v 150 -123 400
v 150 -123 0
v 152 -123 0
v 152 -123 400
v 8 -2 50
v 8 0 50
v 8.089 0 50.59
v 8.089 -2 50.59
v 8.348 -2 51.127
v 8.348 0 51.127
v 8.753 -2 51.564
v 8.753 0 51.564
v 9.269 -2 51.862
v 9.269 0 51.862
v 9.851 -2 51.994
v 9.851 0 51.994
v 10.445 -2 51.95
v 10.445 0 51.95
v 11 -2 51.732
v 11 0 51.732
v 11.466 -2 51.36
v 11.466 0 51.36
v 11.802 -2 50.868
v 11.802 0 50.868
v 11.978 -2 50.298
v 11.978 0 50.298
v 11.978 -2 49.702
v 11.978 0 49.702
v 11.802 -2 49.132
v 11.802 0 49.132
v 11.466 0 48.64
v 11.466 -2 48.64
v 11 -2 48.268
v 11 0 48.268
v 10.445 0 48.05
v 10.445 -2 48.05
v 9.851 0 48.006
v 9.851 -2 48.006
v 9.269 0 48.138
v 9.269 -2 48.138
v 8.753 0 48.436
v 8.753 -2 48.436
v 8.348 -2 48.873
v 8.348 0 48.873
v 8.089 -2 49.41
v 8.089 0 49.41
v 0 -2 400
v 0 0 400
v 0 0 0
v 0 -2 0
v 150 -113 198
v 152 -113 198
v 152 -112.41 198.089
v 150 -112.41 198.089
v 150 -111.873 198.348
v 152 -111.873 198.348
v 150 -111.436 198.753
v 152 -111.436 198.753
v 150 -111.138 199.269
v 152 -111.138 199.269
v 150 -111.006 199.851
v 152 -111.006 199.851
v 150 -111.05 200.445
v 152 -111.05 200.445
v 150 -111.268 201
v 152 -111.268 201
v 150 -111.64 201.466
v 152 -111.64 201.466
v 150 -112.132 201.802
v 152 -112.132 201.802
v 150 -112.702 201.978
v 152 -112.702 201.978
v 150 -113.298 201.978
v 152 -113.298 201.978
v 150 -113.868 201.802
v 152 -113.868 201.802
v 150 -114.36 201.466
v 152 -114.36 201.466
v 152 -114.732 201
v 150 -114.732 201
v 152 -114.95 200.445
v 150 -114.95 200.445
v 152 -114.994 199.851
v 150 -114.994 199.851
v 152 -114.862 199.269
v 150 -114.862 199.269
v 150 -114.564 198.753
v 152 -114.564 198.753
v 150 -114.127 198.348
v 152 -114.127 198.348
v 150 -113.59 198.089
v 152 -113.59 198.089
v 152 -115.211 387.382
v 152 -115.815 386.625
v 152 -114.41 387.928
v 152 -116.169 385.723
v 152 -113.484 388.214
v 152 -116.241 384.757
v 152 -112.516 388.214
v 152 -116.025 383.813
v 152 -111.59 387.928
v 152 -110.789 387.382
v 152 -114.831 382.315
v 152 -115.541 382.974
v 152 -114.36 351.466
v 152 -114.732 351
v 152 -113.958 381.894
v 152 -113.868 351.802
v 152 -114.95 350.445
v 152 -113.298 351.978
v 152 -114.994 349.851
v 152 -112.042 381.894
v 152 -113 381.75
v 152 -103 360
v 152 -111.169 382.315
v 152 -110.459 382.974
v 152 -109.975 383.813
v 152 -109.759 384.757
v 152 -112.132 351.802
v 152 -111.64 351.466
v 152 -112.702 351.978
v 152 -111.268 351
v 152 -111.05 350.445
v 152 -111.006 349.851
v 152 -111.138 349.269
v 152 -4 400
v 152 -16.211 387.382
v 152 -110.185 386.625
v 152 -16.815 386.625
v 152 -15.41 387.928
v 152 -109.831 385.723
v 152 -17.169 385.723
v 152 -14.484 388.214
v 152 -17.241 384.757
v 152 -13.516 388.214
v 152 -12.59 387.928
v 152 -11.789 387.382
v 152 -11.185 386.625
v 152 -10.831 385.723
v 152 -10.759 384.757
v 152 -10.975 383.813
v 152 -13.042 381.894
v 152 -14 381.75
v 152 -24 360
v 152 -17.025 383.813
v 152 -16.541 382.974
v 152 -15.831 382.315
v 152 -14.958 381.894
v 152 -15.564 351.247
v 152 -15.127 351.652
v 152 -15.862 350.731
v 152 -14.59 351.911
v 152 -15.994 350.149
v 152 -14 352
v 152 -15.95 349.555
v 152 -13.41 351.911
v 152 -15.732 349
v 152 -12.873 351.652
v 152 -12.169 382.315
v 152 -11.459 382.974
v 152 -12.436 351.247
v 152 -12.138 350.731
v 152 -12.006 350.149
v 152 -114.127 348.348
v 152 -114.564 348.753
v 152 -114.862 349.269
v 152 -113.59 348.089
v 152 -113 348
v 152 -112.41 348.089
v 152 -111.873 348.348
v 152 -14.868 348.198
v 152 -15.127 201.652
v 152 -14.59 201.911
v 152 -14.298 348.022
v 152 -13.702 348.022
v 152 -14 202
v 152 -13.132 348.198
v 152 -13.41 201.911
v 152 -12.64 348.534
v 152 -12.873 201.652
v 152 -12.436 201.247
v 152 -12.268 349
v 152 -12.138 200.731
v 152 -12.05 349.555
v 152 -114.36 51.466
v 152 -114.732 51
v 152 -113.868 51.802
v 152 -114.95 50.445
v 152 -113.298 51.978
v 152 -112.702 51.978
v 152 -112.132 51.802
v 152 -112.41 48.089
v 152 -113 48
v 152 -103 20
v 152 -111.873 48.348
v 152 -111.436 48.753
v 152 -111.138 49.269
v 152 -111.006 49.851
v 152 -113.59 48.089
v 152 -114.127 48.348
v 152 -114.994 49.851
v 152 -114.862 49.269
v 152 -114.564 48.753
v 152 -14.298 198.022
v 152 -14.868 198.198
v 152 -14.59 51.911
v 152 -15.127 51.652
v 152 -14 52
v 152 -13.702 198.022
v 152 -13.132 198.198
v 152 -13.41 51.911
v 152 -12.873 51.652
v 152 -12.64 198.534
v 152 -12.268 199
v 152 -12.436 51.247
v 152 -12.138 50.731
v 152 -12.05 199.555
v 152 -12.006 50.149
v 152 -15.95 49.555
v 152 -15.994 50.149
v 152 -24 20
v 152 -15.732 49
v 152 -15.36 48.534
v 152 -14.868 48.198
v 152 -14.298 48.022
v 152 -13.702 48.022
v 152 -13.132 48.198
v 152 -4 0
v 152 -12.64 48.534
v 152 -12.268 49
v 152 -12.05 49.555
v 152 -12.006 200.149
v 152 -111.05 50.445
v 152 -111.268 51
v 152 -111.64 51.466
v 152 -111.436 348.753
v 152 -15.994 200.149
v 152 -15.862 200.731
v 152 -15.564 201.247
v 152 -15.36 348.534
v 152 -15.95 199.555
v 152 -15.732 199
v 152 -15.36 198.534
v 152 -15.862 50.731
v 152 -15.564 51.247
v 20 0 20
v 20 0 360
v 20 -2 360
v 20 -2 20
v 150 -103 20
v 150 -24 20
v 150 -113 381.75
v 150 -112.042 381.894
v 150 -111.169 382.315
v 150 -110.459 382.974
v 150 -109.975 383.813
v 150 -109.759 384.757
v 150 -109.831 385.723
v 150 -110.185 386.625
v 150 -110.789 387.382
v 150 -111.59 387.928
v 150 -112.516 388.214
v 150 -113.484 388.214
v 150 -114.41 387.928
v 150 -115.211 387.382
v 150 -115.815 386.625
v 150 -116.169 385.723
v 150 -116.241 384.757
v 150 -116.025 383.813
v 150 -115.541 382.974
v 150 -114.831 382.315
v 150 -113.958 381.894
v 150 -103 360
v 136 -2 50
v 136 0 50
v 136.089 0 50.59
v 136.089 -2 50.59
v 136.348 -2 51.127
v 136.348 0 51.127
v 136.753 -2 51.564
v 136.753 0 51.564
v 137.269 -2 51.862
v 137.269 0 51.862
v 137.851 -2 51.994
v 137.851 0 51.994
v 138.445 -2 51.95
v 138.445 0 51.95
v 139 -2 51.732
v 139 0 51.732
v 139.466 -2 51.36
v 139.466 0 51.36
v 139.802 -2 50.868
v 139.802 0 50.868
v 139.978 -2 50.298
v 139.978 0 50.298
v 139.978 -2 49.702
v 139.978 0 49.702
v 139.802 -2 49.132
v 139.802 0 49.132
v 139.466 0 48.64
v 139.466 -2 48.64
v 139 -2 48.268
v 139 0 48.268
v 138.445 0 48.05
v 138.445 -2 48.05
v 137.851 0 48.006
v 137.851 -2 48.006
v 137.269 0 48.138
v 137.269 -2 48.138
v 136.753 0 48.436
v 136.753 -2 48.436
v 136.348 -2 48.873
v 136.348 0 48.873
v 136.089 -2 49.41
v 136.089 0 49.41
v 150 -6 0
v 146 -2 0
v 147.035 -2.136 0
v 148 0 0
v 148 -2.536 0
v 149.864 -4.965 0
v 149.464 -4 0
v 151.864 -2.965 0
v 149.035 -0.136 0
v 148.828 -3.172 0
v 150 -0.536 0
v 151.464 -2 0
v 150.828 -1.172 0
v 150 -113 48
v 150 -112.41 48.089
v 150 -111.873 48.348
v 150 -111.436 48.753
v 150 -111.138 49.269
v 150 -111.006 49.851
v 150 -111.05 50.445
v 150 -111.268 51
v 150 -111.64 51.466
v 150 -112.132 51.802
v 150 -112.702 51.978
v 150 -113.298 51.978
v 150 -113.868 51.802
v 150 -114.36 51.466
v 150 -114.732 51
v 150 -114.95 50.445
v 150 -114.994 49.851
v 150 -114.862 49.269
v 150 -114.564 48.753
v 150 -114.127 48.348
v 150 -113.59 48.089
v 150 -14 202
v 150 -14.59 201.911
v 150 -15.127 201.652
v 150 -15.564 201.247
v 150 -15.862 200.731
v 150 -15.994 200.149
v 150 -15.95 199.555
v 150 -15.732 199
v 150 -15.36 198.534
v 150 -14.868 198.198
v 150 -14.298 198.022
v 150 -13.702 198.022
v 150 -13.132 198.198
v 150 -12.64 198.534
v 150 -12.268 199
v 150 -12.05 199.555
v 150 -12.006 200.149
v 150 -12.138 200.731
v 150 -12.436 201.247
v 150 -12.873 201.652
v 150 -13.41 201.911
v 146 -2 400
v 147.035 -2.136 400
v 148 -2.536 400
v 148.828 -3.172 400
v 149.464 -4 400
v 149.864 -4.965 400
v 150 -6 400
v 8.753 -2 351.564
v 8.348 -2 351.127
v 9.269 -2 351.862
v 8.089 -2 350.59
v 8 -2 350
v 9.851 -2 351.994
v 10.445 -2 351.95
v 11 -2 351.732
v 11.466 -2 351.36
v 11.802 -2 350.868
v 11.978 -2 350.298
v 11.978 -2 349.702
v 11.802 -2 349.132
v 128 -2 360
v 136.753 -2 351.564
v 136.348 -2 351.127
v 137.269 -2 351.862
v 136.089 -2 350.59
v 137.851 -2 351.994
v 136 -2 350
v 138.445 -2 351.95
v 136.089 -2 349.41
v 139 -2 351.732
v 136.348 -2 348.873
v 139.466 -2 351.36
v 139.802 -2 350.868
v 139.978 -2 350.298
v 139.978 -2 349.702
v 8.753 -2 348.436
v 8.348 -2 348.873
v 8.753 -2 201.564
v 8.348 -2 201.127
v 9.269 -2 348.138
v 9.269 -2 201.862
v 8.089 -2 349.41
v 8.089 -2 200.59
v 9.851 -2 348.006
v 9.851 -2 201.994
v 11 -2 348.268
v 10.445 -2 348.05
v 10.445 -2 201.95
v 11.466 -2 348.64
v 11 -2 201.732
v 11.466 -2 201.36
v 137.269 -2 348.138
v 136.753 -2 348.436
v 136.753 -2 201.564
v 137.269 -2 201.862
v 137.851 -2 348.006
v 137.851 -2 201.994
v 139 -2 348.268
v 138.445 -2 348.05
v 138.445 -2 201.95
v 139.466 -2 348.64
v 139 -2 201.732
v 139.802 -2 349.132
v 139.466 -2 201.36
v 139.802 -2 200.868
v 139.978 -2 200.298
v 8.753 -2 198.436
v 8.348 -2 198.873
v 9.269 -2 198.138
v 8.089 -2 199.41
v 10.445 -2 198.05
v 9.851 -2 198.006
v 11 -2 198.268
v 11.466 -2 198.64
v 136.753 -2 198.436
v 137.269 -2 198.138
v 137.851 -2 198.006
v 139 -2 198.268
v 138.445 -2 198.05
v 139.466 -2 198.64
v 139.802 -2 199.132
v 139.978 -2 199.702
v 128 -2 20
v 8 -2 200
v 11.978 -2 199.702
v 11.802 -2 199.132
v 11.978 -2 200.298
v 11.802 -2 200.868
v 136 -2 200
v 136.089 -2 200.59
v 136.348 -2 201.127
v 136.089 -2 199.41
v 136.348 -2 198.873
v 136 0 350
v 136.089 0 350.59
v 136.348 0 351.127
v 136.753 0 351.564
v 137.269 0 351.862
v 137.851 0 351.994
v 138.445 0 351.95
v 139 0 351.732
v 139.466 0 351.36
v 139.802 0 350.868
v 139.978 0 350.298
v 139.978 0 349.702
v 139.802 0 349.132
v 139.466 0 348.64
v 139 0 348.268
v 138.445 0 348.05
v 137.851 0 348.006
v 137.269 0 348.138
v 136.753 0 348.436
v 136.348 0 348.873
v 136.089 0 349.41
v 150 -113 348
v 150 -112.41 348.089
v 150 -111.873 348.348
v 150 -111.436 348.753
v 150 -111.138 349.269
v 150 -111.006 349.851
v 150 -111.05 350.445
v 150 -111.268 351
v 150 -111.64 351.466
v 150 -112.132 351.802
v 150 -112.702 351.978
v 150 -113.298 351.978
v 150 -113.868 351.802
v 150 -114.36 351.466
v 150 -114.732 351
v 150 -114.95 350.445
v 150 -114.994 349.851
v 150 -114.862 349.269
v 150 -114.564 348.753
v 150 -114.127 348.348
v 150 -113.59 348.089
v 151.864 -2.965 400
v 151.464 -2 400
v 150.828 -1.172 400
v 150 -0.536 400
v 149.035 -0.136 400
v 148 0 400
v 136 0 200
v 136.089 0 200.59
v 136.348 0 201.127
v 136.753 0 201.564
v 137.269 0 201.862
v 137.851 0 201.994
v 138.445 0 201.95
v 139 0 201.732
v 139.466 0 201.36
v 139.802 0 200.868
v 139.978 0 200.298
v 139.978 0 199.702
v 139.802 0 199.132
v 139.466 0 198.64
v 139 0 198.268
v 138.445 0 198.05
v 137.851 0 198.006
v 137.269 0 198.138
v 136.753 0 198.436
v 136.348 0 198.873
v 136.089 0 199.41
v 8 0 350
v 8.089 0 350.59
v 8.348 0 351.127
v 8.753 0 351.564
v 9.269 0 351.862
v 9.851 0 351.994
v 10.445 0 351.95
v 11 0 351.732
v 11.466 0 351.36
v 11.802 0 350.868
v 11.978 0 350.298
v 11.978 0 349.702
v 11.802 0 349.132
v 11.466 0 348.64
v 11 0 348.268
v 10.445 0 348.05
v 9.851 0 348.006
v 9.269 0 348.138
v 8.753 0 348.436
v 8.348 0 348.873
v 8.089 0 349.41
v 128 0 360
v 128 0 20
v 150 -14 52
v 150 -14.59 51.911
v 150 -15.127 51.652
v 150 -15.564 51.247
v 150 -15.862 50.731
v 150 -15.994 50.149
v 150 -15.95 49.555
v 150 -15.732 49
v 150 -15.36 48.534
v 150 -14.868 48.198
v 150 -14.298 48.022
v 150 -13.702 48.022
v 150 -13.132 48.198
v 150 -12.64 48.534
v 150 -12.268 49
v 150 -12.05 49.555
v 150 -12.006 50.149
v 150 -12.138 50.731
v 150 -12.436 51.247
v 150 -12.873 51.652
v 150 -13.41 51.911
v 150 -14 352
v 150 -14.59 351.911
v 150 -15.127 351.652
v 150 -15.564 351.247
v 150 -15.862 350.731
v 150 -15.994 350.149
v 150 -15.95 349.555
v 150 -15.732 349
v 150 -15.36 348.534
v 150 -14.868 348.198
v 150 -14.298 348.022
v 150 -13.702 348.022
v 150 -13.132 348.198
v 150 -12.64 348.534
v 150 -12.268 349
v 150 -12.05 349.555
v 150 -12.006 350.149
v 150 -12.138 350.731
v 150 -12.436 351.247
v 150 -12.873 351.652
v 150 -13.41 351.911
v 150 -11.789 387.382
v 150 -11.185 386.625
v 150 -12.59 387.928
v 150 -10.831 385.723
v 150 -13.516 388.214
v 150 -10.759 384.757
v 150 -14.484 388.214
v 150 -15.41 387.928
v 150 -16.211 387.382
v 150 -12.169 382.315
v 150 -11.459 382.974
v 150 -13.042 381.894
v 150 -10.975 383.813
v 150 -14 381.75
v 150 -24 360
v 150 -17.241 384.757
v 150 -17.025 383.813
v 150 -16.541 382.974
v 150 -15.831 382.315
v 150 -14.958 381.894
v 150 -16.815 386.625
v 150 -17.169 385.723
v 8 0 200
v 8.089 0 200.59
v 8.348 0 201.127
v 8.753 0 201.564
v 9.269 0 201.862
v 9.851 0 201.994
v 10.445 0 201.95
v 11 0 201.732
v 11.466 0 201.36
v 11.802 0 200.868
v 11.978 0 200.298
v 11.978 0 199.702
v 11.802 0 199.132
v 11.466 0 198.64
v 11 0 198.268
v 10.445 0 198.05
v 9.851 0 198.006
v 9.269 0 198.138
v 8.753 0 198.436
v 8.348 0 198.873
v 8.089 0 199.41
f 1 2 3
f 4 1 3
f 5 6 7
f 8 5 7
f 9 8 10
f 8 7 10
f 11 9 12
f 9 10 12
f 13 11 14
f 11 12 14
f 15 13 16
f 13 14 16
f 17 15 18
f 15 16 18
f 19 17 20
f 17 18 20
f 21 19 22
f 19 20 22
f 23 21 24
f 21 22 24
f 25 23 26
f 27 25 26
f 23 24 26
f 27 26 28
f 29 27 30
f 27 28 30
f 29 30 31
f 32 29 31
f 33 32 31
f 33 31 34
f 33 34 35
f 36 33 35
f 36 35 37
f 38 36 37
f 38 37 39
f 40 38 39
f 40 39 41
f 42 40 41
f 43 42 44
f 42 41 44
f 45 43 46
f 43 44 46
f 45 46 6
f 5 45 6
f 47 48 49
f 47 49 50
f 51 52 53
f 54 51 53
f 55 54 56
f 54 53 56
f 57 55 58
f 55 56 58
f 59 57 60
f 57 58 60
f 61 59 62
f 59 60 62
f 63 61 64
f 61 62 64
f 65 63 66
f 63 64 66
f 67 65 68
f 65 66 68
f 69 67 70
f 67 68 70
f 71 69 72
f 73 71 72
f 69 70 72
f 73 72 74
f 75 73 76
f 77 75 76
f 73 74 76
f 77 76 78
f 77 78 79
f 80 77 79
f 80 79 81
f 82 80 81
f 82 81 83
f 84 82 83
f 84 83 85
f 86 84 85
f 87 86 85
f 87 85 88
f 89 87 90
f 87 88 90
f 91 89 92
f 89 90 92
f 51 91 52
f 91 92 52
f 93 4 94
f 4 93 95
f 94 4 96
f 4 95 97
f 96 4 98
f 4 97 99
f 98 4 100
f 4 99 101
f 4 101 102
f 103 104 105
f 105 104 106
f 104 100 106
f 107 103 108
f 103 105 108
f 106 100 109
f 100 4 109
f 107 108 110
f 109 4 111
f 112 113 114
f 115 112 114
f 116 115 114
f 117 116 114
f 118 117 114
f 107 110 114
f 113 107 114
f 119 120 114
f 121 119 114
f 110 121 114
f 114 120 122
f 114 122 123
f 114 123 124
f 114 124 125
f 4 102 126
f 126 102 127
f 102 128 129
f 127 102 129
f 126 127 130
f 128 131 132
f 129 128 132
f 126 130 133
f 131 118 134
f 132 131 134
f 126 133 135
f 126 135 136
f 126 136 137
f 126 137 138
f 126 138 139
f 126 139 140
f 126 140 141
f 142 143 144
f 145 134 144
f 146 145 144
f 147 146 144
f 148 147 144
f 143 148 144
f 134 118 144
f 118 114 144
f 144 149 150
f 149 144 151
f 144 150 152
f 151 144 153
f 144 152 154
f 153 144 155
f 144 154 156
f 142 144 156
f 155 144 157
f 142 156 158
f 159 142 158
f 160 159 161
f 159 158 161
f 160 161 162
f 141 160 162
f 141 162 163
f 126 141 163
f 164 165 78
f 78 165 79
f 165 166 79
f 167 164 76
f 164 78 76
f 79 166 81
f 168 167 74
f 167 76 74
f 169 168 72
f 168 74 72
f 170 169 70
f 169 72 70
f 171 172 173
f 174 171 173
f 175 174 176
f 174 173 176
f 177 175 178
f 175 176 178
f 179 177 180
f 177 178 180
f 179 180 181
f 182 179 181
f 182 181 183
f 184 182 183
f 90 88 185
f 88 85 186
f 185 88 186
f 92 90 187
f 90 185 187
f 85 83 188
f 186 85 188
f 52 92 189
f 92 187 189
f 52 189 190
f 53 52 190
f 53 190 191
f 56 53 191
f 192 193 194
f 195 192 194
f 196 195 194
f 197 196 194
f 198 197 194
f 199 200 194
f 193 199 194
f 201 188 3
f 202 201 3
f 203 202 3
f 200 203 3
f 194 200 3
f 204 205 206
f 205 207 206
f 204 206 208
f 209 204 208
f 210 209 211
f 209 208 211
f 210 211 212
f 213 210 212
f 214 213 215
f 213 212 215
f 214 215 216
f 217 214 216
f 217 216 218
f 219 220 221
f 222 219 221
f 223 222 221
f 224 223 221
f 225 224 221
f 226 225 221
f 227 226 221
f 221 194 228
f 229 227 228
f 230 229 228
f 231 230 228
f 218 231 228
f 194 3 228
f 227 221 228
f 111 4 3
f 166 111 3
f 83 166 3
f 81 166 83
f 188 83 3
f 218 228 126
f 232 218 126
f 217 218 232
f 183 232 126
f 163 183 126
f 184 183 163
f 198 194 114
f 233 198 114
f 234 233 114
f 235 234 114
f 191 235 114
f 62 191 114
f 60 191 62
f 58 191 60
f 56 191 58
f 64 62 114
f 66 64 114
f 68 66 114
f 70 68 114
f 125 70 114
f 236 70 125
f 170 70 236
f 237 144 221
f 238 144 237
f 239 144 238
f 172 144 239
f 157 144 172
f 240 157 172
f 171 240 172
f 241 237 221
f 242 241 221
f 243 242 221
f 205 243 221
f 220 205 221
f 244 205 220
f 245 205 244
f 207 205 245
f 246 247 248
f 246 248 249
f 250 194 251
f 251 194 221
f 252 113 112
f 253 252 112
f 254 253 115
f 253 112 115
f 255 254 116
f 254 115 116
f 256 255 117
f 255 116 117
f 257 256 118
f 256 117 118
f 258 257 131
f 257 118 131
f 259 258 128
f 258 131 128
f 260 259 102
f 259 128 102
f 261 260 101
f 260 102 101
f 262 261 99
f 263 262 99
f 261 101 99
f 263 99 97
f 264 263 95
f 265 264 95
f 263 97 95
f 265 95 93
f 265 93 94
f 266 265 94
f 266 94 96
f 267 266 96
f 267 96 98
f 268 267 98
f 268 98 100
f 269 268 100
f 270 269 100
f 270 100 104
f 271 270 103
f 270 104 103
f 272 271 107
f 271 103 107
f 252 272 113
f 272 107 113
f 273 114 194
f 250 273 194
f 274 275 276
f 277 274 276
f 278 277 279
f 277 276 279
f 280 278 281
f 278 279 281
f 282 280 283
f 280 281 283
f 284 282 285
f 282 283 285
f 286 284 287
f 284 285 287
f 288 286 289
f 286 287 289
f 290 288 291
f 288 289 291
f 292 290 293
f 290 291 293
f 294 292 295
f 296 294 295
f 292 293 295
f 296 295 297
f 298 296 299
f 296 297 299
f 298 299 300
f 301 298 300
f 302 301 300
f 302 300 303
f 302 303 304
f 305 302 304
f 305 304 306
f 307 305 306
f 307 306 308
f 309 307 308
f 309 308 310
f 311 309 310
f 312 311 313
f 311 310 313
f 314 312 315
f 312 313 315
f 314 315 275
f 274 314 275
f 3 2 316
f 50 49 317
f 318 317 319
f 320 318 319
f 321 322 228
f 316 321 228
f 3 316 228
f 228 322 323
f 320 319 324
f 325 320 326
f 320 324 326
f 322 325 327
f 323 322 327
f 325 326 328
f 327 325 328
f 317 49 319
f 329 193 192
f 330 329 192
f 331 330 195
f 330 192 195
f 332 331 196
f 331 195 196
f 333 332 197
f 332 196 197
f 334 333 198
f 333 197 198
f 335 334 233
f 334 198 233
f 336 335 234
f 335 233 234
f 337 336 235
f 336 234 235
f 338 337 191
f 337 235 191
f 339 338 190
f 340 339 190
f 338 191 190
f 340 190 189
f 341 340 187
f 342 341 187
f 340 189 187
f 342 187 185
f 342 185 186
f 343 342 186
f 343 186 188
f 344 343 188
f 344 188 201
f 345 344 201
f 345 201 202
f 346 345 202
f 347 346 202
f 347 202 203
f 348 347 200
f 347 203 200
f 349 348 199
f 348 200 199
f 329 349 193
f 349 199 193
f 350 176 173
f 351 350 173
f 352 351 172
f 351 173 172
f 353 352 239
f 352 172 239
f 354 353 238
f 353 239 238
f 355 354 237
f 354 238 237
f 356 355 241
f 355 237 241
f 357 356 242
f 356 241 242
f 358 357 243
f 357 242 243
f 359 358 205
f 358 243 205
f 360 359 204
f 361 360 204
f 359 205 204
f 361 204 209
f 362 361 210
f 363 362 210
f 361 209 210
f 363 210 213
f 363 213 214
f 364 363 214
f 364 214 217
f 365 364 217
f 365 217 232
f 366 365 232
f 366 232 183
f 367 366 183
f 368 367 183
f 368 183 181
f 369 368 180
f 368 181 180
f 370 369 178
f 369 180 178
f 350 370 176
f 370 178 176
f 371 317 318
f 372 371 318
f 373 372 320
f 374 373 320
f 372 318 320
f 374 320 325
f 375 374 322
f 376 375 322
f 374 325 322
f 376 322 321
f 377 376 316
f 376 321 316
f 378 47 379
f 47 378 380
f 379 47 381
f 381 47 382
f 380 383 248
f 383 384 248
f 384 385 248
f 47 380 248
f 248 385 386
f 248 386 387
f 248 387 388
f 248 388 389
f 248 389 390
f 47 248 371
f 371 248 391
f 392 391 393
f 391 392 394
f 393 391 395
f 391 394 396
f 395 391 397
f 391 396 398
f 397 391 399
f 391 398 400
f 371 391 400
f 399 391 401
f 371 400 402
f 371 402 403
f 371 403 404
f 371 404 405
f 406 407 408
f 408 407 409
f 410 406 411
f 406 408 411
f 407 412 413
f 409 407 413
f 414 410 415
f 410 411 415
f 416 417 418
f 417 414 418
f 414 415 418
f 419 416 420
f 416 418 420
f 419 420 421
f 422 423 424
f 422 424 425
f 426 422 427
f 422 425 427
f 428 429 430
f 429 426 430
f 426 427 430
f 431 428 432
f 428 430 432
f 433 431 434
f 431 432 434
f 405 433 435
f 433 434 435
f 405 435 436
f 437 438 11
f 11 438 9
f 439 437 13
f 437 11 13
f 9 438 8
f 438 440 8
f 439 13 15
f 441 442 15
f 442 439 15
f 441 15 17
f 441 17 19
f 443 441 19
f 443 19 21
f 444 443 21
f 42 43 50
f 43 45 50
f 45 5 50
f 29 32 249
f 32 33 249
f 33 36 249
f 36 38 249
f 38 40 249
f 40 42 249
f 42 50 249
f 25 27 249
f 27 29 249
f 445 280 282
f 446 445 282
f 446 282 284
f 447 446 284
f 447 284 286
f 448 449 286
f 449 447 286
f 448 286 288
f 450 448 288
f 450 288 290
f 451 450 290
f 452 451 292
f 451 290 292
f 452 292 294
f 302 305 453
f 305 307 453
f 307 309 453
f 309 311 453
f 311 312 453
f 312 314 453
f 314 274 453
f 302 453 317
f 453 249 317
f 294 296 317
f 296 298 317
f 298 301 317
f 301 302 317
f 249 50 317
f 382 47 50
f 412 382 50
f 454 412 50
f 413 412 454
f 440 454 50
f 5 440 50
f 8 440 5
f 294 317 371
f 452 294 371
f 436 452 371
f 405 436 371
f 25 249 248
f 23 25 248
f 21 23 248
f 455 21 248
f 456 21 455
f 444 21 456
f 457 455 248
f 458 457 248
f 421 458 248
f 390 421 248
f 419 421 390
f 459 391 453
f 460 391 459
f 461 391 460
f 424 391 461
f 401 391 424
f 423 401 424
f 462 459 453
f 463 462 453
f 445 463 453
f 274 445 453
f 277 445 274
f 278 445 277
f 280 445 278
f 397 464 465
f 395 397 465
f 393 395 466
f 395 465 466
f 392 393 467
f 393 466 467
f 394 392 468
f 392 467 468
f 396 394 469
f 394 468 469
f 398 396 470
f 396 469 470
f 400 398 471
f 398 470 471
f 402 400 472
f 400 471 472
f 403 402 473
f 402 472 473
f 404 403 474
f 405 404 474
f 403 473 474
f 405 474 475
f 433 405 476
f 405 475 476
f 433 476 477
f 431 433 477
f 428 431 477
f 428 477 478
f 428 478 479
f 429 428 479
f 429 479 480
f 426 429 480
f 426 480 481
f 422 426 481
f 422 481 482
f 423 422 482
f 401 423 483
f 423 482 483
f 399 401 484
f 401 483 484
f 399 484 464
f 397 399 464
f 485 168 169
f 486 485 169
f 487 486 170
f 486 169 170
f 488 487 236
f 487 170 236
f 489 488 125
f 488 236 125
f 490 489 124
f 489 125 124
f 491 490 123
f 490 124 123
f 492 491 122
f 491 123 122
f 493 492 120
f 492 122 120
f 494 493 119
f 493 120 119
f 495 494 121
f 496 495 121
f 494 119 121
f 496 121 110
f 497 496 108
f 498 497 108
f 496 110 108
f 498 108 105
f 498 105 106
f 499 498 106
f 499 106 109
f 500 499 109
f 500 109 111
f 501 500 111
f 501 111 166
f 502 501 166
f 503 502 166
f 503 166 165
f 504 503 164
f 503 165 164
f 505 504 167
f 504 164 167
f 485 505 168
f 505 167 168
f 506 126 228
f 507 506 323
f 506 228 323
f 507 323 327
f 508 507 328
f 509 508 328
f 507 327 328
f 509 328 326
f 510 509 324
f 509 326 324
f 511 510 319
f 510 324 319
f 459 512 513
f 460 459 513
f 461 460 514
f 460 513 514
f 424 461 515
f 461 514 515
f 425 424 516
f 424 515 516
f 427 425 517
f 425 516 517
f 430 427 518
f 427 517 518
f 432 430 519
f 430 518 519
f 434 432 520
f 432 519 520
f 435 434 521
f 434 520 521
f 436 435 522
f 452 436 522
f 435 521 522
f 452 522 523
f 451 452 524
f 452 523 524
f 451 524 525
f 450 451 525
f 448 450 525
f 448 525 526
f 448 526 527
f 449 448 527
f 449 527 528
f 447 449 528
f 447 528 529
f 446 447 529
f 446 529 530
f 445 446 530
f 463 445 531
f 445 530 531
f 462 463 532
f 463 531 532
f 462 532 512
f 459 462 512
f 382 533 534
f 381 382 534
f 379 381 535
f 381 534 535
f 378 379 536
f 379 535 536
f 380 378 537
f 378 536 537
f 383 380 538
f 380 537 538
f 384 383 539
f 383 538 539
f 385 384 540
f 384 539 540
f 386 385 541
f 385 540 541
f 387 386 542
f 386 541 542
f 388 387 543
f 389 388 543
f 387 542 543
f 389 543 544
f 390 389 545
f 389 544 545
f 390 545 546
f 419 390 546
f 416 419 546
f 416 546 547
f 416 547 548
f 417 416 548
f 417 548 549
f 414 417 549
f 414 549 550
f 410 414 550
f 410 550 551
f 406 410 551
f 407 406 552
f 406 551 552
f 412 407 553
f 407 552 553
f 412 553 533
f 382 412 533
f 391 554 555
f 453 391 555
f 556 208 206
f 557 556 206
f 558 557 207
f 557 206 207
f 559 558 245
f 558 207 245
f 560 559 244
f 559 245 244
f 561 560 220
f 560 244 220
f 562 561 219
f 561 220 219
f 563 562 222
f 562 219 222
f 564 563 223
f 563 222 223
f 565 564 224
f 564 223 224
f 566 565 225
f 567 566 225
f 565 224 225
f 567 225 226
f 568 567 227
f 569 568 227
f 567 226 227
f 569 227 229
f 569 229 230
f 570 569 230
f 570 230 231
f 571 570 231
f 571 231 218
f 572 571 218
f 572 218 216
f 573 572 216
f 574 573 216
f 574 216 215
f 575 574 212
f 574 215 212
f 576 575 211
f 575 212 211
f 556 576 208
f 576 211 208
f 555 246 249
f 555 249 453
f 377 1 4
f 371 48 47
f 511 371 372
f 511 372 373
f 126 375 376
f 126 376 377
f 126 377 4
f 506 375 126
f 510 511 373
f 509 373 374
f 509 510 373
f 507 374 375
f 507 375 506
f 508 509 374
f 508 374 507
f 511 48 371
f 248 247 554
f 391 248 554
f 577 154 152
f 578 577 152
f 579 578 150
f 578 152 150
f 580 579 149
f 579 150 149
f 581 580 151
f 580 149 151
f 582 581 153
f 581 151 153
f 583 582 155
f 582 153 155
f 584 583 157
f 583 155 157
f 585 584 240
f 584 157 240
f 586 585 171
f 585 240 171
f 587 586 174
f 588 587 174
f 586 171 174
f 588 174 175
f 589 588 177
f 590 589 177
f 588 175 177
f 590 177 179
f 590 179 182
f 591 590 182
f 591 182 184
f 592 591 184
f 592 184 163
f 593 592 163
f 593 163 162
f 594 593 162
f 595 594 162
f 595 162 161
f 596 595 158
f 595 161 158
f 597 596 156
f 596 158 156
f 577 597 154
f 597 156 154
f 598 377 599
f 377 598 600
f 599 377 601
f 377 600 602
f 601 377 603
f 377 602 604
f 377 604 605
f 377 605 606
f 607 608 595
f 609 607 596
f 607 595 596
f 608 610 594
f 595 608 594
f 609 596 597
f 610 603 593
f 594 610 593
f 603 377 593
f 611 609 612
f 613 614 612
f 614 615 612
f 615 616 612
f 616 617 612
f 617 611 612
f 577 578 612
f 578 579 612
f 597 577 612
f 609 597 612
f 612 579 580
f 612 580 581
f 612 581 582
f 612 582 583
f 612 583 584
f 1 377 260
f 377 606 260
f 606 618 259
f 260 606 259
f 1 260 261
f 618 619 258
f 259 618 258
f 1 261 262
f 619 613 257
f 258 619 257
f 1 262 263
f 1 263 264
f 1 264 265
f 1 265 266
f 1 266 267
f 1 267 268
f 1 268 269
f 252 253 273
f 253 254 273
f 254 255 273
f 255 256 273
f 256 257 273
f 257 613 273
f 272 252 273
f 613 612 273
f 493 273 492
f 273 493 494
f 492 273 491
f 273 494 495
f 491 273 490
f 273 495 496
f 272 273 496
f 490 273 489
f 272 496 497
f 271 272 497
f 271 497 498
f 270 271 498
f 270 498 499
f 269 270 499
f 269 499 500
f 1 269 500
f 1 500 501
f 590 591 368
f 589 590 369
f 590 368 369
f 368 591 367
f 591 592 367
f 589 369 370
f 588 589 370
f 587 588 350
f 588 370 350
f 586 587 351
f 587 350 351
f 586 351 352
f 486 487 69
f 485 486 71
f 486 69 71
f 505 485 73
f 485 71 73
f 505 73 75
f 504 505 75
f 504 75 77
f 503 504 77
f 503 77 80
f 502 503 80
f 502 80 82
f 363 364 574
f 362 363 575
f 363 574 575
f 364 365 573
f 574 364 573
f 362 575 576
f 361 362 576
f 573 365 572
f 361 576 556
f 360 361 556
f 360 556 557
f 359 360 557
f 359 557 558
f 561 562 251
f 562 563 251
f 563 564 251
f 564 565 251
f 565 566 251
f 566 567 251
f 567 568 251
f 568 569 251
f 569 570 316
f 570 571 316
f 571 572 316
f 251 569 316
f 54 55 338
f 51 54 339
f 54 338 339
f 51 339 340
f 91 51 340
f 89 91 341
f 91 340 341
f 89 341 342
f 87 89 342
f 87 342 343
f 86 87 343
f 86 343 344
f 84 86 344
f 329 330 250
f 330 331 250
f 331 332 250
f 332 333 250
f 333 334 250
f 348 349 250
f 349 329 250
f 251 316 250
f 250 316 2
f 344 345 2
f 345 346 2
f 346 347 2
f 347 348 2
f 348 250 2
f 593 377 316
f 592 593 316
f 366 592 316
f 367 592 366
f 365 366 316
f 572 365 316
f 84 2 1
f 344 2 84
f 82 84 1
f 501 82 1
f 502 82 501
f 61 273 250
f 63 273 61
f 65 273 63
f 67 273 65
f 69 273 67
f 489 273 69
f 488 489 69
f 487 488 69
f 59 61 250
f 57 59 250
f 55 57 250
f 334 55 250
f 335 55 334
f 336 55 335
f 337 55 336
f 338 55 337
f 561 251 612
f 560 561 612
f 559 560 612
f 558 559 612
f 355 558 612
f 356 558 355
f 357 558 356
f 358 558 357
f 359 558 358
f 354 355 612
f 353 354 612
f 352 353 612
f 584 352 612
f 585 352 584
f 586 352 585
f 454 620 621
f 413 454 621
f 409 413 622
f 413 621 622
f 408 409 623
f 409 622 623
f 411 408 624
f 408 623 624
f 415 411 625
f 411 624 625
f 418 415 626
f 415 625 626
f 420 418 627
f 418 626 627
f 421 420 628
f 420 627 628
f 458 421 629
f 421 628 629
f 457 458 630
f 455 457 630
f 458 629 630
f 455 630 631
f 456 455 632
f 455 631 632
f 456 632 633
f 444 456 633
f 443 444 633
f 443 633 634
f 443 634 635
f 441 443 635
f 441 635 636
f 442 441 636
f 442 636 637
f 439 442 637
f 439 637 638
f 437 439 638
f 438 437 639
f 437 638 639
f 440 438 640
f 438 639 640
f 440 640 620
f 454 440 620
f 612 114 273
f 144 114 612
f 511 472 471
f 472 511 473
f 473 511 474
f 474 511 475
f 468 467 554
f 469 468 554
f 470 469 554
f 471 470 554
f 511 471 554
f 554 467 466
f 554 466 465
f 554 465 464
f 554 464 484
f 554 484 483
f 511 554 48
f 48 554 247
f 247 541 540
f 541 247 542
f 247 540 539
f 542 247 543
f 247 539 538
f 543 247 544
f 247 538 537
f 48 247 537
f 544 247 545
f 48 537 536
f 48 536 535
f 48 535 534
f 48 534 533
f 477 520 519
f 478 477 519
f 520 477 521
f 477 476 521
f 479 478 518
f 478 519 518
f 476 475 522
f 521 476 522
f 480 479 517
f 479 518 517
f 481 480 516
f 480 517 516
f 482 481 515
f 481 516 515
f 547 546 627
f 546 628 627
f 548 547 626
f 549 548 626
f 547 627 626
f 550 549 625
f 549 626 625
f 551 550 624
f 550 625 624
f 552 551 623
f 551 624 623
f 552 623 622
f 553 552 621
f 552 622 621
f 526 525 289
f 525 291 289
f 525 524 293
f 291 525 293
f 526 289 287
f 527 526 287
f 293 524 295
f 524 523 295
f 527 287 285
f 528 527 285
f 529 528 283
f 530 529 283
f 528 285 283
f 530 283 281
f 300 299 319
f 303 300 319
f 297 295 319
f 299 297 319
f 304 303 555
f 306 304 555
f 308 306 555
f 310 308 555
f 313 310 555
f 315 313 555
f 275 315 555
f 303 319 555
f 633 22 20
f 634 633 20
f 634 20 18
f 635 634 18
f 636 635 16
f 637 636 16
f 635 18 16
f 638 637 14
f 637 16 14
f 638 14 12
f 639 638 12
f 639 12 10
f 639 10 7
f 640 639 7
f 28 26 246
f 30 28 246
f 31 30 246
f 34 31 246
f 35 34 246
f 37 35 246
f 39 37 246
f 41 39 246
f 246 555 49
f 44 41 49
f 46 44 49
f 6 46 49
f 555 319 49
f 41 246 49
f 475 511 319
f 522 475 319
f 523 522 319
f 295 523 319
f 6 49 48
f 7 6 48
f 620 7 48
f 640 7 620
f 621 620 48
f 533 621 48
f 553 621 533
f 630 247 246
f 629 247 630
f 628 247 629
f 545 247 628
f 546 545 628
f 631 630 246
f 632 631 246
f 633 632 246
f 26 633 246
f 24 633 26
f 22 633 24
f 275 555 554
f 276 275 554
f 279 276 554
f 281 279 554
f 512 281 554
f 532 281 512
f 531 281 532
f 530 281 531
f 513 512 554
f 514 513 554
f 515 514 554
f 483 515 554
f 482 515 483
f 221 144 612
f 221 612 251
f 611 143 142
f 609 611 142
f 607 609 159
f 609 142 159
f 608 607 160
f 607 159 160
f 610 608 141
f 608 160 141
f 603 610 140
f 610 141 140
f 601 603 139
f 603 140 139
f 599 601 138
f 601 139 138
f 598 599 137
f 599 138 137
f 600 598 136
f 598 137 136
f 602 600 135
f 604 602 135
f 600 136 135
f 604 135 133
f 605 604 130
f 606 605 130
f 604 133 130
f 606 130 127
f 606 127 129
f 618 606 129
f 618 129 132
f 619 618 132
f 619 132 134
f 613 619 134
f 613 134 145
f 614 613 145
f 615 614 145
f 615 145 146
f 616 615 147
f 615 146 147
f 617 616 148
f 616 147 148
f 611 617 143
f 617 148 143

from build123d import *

# Parameters (mm, degrees)
BOSS_EXTRUDE1_DEPTH = 400
SKETCH3_W           = 340
SKETCH3_H           = 79
CUT_EXTRUDE1_DEPTH  = 2
SKETCH4_W           = 108
SKETCH4_H           = 340
CUT_EXTRUDE2_DEPTH  = 2
SKETCH6_R           = 3.25
CUT_EXTRUDE3_DEPTH  = 2
SKETCH7_R           = 2
CUT_EXTRUDE4_DEPTH  = 2
SKETCH8_R           = 2
CUT_EXTRUDE5_DEPTH  = 2


with BuildPart() as part:
    # Sketch1 → Boss-Extrude1 (new body)
    with BuildSketch(Plane.XY):
        with BuildLine():
            Line((0, 0), (0, -2))
            Line((0, -2), (146, -2))
            ThreePointArc((146, -2), (148.828427125, -3.171572875), (150, -6))
            Line((150, -6), (150, -123))
            Line((150, -123), (152, -123))
            Line((152, -123), (152, -4))
            ThreePointArc((152, -4), (150.828427125, -1.171572875), (148, 0))
            Line((148, 0), (0, 0))
        make_face()
    extrude(amount=BOSS_EXTRUDE1_DEPTH)

    # Sketch3 → Cut-Extrude1 (cut)
    with BuildSketch(Plane(origin=(152, 0, 0), x_dir=(0, 0, -1), z_dir=(1, 0, 0))):
        with Locations((-190, -63.5)):
            Rectangle(SKETCH3_W, SKETCH3_H)
    extrude(amount=-CUT_EXTRUDE1_DEPTH, mode=Mode.SUBTRACT)

    # Sketch4 → Cut-Extrude2 (cut)
    with BuildSketch(Plane(origin=(0, 0, 0), x_dir=(1, 0, 0), z_dir=(0, 1, 0))):
        with Locations((74, -190)):
            Rectangle(SKETCH4_W, SKETCH4_H)
    extrude(amount=-CUT_EXTRUDE2_DEPTH, mode=Mode.SUBTRACT)

    # Sketch6 → Cut-Extrude3 (cut)
    with BuildSketch(Plane(origin=(152, 0, 0), x_dir=(0, 0, -1), z_dir=(1, 0, 0))):
        with Locations((-385, -14)):
            Circle(SKETCH6_R)
        with Locations((-385, -113)):
            Circle(SKETCH6_R)
    extrude(amount=-CUT_EXTRUDE3_DEPTH, mode=Mode.SUBTRACT)

    # Sketch7 → Cut-Extrude4 (cut)
    with BuildSketch(Plane(origin=(0, 0, 0), x_dir=(1, 0, 0), z_dir=(0, 1, 0))):
        with Locations(Location((10, -50, 0), (0, 0, 180))):
            Circle(SKETCH7_R)
        with Locations(Location((10, -200, 0), (0, 0, 180))):
            Circle(SKETCH7_R)
        with Locations(Location((10, -350, 0), (0, 0, 180))):
            Circle(SKETCH7_R)
        with Locations(Location((138, -50, 0), (0, 0, 180))):
            Circle(SKETCH7_R)
        with Locations(Location((138, -200, 0), (0, 0, 180))):
            Circle(SKETCH7_R)
        with Locations(Location((138, -350, 0), (0, 0, 180))):
            Circle(SKETCH7_R)
    extrude(amount=-CUT_EXTRUDE4_DEPTH, mode=Mode.SUBTRACT)

    # Sketch8 → Cut-Extrude5 (cut)
    with BuildSketch(Plane(origin=(152, 0, 0), x_dir=(0, 0, -1), z_dir=(1, 0, 0))):
        with Locations((-50, -113)):
            Circle(SKETCH8_R)
        with Locations((-200, -113)):
            Circle(SKETCH8_R)
        with Locations((-350, -113)):
            Circle(SKETCH8_R)
        with Locations(Location((-350, -14, 0), (0, 0, 180))):
            Circle(SKETCH8_R)
        with Locations(Location((-200, -14, 0), (0, 0, 180))):
            Circle(SKETCH8_R)
        with Locations(Location((-50, -14, 0), (0, 0, 180))):
            Circle(SKETCH8_R)
    extrude(amount=-CUT_EXTRUDE5_DEPTH, mode=Mode.SUBTRACT)


solid = part.part
